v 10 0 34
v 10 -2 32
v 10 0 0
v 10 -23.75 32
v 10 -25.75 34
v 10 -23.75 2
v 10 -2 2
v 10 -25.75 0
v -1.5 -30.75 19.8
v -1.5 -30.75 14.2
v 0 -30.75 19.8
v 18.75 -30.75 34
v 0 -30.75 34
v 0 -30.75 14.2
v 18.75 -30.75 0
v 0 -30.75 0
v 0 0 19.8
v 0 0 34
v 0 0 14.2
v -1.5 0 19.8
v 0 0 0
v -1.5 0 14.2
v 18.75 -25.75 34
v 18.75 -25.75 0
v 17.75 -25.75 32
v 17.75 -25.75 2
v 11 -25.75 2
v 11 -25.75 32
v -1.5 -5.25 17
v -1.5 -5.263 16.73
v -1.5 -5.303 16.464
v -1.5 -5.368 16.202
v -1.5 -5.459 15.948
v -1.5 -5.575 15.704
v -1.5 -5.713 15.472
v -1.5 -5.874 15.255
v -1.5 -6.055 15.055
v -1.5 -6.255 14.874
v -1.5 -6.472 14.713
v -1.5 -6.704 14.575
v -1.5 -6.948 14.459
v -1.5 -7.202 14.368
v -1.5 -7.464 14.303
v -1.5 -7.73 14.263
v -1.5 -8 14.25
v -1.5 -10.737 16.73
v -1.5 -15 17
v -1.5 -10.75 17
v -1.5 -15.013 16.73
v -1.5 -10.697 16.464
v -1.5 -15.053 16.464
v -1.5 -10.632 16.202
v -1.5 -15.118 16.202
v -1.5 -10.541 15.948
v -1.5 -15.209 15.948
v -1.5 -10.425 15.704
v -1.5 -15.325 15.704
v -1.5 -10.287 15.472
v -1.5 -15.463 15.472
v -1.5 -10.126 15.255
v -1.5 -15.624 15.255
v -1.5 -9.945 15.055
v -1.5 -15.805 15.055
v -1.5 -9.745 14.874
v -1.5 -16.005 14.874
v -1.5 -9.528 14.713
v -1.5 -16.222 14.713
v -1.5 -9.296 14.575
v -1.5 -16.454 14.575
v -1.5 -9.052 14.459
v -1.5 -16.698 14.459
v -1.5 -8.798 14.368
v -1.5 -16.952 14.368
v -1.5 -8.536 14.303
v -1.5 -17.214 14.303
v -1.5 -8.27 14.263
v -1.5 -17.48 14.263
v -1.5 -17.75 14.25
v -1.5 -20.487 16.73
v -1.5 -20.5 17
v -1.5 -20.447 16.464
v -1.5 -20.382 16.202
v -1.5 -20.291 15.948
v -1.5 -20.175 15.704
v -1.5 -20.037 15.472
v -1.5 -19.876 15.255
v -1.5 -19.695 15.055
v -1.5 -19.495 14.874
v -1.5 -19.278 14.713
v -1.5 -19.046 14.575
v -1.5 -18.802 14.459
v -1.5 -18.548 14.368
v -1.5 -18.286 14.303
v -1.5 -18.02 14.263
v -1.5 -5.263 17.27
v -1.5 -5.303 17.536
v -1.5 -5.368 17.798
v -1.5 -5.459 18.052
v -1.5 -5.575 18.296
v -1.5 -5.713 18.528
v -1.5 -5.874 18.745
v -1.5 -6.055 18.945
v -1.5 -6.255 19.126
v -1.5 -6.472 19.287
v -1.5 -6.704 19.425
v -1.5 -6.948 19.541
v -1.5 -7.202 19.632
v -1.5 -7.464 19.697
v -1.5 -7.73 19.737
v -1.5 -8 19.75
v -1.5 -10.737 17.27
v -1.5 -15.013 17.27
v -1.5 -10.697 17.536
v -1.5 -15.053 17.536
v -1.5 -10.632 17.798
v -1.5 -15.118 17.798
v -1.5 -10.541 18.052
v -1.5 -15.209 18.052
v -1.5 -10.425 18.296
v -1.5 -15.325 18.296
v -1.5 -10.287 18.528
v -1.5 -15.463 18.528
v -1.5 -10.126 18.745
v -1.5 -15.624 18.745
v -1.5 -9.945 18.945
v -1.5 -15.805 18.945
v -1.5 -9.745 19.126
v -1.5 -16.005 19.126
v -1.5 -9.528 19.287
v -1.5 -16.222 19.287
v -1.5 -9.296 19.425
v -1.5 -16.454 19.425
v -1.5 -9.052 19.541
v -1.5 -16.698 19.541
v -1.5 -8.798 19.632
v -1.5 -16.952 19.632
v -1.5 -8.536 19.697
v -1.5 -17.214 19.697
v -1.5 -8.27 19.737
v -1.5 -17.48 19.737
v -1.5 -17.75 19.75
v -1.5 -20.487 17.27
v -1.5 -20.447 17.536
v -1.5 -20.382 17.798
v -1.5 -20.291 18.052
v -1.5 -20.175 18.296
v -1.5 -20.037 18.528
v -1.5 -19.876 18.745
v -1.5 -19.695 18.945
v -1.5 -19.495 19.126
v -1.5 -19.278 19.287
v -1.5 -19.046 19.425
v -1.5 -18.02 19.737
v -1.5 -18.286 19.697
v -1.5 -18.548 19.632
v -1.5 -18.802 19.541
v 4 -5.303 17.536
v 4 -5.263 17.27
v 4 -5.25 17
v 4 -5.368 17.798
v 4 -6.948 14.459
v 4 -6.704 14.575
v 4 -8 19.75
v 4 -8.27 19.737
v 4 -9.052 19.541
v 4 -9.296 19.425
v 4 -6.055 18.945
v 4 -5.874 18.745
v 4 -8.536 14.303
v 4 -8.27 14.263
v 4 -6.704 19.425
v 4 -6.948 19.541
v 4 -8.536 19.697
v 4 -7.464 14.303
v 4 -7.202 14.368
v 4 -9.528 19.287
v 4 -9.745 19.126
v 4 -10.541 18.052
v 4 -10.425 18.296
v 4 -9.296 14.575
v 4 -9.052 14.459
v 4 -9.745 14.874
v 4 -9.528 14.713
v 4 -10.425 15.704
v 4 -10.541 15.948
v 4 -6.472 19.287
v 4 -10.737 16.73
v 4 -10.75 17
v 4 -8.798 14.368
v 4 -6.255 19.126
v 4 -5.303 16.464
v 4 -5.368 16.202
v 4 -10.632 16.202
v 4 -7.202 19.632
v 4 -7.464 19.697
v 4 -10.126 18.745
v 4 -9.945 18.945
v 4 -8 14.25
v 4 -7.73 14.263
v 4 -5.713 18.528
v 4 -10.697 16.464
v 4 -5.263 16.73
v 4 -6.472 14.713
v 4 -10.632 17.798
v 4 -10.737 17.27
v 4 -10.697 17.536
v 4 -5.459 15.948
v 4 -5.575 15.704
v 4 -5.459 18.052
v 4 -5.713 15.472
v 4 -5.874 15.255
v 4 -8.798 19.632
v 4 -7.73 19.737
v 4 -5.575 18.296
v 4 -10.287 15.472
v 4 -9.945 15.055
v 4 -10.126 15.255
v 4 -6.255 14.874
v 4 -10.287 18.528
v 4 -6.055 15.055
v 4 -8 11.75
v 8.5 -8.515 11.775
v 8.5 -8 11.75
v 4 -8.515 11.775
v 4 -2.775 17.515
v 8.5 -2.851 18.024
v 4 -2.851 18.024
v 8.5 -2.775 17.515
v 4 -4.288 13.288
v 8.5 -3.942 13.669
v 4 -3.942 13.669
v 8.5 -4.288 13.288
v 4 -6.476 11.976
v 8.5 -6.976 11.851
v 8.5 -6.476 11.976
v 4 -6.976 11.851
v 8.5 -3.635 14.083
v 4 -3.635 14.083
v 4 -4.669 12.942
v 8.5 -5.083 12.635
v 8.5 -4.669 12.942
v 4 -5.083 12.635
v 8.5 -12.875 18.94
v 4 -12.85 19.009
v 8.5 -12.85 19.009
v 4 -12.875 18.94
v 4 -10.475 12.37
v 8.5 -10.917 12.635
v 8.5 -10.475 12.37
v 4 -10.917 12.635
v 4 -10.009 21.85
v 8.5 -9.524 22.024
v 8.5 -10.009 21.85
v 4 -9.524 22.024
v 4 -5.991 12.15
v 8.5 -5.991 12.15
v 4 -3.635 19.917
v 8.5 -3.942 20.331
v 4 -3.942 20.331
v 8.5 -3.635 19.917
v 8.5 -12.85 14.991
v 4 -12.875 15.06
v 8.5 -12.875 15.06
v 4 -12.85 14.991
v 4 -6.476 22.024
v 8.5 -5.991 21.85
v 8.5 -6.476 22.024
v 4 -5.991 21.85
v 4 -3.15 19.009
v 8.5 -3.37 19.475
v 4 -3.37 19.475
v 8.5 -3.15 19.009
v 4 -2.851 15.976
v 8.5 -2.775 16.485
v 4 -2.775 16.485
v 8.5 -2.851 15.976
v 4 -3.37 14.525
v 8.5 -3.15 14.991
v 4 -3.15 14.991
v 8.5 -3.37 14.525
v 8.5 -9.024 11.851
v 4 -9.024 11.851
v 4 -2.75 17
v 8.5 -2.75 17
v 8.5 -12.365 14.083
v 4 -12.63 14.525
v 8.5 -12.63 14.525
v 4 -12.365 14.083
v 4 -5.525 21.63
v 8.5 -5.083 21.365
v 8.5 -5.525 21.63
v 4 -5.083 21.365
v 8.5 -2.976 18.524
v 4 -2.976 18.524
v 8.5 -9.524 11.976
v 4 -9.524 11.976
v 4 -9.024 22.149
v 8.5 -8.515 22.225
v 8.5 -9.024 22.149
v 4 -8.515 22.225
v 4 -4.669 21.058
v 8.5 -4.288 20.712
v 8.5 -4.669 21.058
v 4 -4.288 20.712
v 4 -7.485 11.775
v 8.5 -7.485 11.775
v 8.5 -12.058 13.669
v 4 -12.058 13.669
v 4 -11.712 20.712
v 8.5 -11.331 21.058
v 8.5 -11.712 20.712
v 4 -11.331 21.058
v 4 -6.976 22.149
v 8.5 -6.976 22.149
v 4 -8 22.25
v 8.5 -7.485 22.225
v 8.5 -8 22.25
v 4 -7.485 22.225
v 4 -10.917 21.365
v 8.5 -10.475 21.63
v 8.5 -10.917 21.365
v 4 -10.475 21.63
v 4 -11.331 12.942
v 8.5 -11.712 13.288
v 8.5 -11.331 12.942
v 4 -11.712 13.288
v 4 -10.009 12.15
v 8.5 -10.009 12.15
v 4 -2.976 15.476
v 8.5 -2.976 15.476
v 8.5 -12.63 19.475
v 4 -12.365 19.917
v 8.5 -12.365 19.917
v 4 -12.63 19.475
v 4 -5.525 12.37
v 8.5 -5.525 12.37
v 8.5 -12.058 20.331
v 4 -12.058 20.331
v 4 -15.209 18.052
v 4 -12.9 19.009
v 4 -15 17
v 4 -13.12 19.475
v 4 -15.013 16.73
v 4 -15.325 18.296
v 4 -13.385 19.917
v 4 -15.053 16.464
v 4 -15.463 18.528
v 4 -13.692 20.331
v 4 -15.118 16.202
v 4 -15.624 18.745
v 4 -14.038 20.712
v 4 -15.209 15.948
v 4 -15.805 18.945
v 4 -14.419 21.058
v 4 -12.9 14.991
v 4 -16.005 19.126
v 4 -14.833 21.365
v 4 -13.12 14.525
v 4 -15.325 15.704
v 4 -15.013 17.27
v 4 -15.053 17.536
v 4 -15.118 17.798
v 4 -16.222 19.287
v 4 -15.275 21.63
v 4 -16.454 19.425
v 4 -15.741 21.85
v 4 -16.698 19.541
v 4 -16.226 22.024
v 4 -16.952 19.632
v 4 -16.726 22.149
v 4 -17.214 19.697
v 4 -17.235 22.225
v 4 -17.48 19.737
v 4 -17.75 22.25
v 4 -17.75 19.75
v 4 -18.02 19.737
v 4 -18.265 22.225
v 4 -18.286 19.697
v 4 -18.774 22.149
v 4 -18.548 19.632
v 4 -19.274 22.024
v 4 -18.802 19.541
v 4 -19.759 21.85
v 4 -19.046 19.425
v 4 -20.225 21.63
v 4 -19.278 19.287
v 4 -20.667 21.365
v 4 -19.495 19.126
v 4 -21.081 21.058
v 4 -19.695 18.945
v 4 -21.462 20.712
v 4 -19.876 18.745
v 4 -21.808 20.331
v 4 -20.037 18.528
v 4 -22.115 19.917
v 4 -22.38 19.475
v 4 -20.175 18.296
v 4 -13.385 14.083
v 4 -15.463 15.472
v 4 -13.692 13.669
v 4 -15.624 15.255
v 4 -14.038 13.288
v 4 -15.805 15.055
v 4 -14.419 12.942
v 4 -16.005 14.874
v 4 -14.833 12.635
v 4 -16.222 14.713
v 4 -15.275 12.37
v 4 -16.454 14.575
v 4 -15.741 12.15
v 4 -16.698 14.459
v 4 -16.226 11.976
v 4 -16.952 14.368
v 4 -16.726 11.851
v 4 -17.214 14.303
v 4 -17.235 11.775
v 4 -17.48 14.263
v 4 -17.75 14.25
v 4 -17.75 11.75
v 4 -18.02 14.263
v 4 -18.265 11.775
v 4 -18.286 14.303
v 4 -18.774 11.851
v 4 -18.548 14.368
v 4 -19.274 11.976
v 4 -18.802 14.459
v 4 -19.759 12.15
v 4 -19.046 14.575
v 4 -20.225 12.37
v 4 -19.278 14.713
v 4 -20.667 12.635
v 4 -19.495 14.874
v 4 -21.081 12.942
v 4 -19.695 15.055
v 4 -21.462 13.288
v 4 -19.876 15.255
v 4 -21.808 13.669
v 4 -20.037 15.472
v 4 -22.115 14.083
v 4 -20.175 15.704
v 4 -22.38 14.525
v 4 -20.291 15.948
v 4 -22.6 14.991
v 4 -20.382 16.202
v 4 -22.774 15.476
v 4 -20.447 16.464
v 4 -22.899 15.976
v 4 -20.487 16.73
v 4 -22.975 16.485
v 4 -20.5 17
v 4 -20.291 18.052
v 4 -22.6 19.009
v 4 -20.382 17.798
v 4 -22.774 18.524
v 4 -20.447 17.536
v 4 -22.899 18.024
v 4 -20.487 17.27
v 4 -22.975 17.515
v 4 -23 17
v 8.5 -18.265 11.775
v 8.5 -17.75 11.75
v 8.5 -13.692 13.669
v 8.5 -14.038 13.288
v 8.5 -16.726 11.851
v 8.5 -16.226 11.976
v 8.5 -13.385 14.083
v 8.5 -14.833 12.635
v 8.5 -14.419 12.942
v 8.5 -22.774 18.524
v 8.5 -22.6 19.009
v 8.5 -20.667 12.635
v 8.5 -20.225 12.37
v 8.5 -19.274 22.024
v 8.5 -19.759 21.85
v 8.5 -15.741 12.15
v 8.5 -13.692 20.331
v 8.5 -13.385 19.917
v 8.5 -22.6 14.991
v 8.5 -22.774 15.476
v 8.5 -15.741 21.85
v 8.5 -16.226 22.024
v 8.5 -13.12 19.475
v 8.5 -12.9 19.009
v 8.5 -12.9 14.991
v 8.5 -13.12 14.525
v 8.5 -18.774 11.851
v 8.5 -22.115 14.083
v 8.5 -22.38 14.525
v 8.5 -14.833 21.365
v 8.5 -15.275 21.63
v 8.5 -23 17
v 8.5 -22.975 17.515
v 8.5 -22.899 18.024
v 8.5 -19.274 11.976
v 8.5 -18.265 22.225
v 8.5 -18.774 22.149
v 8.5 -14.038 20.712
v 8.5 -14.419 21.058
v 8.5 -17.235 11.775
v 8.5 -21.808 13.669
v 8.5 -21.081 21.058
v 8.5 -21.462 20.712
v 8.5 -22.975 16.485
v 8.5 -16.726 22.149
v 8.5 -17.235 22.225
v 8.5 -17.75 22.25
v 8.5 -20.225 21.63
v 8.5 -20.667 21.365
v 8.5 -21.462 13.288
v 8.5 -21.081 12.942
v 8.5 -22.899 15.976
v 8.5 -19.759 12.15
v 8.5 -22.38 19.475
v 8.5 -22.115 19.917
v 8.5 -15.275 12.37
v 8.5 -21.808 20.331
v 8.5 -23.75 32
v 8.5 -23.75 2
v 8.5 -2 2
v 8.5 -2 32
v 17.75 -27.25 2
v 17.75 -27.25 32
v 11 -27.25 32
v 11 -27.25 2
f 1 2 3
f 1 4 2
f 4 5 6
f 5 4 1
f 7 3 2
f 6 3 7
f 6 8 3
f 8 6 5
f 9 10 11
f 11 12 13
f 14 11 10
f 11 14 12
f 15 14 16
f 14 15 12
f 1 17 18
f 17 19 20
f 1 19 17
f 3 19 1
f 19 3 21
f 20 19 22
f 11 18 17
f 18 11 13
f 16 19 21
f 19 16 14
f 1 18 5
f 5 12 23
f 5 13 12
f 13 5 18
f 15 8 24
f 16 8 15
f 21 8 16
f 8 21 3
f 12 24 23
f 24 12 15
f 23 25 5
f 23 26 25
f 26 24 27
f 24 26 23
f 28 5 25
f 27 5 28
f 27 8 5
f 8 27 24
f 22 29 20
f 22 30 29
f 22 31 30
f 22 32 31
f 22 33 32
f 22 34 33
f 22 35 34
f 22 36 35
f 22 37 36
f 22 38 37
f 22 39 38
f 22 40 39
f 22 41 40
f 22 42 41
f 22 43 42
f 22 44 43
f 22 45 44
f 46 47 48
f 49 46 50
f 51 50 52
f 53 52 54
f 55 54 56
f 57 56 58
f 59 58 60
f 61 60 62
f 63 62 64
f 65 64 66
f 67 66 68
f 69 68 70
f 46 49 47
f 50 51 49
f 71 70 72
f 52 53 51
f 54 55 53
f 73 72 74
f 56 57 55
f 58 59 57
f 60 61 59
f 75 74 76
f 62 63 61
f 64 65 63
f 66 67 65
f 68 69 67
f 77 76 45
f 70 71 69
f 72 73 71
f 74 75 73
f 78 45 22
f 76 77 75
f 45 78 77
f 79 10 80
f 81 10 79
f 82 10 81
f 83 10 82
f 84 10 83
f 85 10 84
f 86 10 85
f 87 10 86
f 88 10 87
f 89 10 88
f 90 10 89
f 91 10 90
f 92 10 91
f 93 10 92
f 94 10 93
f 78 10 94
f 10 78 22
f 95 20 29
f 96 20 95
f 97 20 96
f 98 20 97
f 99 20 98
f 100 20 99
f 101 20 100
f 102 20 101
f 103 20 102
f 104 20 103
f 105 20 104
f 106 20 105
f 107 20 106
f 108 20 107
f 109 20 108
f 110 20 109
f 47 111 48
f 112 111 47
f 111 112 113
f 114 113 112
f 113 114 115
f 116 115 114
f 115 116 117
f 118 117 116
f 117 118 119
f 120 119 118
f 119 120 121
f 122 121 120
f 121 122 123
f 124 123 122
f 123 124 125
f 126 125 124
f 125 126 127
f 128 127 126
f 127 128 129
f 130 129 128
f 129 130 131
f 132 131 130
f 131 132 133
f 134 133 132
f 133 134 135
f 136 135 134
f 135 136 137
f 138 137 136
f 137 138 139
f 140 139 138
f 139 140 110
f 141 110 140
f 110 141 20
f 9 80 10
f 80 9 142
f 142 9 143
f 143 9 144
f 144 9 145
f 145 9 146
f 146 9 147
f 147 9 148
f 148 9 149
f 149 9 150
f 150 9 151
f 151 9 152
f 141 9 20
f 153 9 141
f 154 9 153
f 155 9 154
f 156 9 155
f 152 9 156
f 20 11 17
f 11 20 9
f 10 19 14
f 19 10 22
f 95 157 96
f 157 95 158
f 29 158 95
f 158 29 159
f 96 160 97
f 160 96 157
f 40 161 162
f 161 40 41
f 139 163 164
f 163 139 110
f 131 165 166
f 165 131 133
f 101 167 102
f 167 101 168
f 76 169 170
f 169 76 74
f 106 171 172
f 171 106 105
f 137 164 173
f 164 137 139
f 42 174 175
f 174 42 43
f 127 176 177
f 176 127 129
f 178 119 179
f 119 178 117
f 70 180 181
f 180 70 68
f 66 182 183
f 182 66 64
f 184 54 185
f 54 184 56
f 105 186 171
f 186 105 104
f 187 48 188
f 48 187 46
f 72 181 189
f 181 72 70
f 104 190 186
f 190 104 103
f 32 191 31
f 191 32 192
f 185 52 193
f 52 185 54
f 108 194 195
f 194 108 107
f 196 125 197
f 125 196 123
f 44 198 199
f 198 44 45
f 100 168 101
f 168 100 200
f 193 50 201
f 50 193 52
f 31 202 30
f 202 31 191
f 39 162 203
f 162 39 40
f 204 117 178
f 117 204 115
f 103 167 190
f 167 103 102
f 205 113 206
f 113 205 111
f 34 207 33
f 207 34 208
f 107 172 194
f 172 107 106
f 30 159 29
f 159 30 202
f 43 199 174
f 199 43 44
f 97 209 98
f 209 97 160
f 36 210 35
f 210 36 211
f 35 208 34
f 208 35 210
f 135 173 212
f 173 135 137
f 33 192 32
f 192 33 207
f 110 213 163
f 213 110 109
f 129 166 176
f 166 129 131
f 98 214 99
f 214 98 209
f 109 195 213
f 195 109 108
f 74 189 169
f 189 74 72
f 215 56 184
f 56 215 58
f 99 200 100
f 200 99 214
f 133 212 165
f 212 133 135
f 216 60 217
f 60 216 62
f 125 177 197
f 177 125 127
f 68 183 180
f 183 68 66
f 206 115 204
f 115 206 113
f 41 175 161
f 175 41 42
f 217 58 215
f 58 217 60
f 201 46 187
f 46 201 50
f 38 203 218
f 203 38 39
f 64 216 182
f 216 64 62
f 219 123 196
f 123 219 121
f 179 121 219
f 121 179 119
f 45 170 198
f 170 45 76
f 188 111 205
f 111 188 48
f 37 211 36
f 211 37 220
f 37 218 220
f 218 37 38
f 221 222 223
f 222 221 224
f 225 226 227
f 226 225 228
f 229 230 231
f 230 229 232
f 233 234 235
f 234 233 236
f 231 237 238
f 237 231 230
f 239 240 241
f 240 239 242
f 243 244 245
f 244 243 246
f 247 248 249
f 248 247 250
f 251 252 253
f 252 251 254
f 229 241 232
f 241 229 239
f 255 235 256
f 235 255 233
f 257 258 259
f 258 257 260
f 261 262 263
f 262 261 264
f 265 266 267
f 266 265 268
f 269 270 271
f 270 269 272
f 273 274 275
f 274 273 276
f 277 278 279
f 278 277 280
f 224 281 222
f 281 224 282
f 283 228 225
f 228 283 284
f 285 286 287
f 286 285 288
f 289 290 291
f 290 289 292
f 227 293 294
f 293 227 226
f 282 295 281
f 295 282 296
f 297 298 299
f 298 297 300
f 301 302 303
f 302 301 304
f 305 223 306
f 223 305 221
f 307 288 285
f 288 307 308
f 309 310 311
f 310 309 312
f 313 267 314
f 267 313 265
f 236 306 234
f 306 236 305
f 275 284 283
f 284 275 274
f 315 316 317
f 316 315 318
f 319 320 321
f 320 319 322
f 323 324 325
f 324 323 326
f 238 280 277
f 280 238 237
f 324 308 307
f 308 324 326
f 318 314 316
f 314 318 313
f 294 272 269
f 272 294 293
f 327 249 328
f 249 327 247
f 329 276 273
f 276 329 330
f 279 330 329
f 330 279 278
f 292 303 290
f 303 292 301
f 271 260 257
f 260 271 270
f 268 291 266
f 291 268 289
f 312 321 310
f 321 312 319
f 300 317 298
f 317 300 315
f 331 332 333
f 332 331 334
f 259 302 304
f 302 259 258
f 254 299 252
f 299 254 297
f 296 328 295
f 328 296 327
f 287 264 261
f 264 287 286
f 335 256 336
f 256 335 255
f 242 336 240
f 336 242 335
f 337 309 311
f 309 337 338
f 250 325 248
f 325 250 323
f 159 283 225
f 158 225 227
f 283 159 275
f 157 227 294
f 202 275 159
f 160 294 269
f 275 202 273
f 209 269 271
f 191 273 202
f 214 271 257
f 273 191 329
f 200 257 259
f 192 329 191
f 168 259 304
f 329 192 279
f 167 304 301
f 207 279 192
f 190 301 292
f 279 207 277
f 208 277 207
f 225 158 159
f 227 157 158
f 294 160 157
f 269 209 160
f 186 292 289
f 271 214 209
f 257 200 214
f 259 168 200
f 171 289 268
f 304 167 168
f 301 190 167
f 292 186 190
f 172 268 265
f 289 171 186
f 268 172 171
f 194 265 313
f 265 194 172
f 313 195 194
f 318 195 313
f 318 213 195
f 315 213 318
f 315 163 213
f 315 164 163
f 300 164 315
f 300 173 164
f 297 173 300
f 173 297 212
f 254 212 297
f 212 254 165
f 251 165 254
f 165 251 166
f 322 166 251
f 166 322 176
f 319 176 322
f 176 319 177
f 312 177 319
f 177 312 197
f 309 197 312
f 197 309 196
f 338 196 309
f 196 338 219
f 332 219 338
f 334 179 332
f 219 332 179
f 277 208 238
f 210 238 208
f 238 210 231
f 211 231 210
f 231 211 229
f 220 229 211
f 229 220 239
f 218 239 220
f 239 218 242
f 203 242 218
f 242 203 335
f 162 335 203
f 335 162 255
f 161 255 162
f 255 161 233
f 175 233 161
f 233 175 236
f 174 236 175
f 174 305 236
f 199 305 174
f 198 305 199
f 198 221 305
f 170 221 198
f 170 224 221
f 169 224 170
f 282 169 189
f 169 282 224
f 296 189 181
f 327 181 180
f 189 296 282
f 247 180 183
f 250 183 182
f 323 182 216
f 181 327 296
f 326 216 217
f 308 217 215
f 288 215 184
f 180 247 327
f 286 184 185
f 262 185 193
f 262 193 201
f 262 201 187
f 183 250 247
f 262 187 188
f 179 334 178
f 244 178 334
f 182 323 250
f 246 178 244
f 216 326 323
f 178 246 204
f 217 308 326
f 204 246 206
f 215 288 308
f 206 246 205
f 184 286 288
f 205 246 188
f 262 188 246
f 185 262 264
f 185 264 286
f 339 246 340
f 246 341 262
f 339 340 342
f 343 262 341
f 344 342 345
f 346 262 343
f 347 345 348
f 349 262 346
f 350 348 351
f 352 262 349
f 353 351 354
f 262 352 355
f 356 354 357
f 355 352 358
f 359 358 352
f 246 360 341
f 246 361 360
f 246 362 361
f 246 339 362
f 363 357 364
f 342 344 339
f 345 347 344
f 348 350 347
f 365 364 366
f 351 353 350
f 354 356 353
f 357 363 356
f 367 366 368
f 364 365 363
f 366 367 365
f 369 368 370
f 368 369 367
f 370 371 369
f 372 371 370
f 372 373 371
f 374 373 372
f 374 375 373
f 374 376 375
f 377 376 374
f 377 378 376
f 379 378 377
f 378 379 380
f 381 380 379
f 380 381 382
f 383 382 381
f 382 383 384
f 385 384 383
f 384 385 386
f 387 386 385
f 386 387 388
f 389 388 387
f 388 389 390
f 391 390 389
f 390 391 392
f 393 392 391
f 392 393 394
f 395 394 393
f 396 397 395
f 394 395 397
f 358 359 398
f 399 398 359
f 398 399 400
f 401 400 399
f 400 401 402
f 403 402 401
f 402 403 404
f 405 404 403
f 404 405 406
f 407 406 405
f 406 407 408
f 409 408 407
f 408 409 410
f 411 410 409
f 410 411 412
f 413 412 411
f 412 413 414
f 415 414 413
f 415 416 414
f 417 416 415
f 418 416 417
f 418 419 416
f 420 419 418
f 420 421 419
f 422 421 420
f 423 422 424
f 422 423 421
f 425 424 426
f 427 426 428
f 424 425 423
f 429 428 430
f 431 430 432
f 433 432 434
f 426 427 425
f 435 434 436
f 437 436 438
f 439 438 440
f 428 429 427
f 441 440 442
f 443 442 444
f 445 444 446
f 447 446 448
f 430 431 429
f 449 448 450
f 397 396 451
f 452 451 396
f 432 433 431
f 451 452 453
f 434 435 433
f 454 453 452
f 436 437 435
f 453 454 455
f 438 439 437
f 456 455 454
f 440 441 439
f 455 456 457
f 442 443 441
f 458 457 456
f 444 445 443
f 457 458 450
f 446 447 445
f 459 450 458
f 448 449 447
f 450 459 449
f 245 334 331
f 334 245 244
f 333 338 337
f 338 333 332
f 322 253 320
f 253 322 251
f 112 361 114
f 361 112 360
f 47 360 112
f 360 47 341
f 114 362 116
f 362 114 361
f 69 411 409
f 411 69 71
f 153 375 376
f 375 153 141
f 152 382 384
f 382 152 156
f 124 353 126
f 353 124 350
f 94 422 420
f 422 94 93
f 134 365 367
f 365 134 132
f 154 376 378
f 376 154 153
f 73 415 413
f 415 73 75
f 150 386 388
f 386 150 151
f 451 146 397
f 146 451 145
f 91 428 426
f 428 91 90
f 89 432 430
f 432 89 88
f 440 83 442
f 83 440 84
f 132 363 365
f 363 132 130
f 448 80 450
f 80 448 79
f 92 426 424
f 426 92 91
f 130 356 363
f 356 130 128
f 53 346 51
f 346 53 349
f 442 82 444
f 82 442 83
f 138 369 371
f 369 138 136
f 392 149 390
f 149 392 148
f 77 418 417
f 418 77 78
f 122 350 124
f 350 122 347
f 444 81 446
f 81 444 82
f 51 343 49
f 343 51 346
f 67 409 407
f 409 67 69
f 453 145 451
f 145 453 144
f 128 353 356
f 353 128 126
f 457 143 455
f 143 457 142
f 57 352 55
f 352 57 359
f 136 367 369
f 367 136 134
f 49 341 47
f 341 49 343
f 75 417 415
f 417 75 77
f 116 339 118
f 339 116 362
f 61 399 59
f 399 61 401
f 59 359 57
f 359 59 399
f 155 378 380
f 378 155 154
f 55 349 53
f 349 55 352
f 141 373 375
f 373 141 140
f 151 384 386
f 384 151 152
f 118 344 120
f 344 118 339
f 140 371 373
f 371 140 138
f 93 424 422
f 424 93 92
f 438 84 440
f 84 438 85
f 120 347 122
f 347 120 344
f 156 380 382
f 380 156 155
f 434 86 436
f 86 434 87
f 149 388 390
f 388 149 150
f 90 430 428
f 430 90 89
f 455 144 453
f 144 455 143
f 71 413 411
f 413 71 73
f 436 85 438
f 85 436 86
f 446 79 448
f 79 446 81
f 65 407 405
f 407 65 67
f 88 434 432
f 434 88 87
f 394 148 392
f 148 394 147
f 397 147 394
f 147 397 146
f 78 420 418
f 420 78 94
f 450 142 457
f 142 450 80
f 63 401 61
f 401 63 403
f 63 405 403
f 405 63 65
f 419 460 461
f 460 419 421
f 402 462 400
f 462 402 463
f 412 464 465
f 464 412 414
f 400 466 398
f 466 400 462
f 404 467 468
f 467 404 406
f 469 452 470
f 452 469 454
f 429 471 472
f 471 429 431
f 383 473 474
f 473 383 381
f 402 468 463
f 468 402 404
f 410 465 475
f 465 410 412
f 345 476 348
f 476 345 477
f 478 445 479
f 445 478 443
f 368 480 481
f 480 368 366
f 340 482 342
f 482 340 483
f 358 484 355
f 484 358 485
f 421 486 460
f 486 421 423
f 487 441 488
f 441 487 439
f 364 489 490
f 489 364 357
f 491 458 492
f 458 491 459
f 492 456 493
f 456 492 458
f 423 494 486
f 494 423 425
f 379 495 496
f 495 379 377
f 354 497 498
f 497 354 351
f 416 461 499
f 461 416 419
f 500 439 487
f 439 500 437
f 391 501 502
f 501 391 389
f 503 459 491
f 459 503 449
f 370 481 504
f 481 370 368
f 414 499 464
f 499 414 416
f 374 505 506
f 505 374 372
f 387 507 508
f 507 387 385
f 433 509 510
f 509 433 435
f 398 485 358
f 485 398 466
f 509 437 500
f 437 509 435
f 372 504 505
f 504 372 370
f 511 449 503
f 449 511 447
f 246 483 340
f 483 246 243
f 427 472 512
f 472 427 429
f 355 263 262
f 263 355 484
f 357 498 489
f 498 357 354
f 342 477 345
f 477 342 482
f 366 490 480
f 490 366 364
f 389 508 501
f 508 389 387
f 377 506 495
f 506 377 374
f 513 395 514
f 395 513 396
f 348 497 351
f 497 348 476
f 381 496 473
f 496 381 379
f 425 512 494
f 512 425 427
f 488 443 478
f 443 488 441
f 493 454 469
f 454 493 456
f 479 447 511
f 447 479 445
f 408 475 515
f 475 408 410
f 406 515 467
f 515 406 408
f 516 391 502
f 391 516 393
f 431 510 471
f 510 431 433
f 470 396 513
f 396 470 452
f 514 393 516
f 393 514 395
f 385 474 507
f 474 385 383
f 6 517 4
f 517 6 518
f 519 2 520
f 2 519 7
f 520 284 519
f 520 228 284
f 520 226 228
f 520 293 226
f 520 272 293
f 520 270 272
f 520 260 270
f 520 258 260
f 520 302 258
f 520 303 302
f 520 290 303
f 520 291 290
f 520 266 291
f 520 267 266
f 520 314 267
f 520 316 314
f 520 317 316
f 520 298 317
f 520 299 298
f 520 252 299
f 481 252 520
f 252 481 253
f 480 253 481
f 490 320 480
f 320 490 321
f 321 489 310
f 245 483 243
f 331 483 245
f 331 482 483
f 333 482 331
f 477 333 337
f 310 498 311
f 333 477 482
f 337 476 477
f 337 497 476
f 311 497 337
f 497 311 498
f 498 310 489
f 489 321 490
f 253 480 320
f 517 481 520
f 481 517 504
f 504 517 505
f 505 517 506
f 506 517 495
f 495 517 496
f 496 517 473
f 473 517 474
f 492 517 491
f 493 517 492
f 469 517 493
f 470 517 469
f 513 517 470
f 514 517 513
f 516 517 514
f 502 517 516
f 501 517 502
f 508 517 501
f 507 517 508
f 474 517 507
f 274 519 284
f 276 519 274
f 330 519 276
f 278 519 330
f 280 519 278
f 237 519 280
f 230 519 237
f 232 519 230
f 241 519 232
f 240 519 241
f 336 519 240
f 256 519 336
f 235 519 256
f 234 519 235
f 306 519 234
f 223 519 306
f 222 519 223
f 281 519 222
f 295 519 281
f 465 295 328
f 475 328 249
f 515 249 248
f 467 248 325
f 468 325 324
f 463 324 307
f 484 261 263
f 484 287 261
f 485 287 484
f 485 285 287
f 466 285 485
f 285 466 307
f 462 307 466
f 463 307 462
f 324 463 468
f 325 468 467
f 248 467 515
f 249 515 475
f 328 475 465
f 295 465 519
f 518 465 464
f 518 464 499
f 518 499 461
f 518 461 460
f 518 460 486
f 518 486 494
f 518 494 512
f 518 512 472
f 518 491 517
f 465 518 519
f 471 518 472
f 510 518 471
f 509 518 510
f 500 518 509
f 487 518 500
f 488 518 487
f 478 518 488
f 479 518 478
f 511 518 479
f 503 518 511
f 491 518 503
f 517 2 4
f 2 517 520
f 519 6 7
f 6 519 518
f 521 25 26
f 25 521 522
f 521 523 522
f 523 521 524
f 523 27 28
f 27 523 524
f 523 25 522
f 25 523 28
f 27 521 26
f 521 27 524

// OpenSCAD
// Padded edge clamp jaw, one per case side (the same part, turned 180 degrees). Print 2.
// Print orientation: on its Y face.
include <params.scad>
include <lib.scad>

rotate([90, 0, 0]) translate([0, jaw_w / 2, -jaw_z0]) edge_clamp();
